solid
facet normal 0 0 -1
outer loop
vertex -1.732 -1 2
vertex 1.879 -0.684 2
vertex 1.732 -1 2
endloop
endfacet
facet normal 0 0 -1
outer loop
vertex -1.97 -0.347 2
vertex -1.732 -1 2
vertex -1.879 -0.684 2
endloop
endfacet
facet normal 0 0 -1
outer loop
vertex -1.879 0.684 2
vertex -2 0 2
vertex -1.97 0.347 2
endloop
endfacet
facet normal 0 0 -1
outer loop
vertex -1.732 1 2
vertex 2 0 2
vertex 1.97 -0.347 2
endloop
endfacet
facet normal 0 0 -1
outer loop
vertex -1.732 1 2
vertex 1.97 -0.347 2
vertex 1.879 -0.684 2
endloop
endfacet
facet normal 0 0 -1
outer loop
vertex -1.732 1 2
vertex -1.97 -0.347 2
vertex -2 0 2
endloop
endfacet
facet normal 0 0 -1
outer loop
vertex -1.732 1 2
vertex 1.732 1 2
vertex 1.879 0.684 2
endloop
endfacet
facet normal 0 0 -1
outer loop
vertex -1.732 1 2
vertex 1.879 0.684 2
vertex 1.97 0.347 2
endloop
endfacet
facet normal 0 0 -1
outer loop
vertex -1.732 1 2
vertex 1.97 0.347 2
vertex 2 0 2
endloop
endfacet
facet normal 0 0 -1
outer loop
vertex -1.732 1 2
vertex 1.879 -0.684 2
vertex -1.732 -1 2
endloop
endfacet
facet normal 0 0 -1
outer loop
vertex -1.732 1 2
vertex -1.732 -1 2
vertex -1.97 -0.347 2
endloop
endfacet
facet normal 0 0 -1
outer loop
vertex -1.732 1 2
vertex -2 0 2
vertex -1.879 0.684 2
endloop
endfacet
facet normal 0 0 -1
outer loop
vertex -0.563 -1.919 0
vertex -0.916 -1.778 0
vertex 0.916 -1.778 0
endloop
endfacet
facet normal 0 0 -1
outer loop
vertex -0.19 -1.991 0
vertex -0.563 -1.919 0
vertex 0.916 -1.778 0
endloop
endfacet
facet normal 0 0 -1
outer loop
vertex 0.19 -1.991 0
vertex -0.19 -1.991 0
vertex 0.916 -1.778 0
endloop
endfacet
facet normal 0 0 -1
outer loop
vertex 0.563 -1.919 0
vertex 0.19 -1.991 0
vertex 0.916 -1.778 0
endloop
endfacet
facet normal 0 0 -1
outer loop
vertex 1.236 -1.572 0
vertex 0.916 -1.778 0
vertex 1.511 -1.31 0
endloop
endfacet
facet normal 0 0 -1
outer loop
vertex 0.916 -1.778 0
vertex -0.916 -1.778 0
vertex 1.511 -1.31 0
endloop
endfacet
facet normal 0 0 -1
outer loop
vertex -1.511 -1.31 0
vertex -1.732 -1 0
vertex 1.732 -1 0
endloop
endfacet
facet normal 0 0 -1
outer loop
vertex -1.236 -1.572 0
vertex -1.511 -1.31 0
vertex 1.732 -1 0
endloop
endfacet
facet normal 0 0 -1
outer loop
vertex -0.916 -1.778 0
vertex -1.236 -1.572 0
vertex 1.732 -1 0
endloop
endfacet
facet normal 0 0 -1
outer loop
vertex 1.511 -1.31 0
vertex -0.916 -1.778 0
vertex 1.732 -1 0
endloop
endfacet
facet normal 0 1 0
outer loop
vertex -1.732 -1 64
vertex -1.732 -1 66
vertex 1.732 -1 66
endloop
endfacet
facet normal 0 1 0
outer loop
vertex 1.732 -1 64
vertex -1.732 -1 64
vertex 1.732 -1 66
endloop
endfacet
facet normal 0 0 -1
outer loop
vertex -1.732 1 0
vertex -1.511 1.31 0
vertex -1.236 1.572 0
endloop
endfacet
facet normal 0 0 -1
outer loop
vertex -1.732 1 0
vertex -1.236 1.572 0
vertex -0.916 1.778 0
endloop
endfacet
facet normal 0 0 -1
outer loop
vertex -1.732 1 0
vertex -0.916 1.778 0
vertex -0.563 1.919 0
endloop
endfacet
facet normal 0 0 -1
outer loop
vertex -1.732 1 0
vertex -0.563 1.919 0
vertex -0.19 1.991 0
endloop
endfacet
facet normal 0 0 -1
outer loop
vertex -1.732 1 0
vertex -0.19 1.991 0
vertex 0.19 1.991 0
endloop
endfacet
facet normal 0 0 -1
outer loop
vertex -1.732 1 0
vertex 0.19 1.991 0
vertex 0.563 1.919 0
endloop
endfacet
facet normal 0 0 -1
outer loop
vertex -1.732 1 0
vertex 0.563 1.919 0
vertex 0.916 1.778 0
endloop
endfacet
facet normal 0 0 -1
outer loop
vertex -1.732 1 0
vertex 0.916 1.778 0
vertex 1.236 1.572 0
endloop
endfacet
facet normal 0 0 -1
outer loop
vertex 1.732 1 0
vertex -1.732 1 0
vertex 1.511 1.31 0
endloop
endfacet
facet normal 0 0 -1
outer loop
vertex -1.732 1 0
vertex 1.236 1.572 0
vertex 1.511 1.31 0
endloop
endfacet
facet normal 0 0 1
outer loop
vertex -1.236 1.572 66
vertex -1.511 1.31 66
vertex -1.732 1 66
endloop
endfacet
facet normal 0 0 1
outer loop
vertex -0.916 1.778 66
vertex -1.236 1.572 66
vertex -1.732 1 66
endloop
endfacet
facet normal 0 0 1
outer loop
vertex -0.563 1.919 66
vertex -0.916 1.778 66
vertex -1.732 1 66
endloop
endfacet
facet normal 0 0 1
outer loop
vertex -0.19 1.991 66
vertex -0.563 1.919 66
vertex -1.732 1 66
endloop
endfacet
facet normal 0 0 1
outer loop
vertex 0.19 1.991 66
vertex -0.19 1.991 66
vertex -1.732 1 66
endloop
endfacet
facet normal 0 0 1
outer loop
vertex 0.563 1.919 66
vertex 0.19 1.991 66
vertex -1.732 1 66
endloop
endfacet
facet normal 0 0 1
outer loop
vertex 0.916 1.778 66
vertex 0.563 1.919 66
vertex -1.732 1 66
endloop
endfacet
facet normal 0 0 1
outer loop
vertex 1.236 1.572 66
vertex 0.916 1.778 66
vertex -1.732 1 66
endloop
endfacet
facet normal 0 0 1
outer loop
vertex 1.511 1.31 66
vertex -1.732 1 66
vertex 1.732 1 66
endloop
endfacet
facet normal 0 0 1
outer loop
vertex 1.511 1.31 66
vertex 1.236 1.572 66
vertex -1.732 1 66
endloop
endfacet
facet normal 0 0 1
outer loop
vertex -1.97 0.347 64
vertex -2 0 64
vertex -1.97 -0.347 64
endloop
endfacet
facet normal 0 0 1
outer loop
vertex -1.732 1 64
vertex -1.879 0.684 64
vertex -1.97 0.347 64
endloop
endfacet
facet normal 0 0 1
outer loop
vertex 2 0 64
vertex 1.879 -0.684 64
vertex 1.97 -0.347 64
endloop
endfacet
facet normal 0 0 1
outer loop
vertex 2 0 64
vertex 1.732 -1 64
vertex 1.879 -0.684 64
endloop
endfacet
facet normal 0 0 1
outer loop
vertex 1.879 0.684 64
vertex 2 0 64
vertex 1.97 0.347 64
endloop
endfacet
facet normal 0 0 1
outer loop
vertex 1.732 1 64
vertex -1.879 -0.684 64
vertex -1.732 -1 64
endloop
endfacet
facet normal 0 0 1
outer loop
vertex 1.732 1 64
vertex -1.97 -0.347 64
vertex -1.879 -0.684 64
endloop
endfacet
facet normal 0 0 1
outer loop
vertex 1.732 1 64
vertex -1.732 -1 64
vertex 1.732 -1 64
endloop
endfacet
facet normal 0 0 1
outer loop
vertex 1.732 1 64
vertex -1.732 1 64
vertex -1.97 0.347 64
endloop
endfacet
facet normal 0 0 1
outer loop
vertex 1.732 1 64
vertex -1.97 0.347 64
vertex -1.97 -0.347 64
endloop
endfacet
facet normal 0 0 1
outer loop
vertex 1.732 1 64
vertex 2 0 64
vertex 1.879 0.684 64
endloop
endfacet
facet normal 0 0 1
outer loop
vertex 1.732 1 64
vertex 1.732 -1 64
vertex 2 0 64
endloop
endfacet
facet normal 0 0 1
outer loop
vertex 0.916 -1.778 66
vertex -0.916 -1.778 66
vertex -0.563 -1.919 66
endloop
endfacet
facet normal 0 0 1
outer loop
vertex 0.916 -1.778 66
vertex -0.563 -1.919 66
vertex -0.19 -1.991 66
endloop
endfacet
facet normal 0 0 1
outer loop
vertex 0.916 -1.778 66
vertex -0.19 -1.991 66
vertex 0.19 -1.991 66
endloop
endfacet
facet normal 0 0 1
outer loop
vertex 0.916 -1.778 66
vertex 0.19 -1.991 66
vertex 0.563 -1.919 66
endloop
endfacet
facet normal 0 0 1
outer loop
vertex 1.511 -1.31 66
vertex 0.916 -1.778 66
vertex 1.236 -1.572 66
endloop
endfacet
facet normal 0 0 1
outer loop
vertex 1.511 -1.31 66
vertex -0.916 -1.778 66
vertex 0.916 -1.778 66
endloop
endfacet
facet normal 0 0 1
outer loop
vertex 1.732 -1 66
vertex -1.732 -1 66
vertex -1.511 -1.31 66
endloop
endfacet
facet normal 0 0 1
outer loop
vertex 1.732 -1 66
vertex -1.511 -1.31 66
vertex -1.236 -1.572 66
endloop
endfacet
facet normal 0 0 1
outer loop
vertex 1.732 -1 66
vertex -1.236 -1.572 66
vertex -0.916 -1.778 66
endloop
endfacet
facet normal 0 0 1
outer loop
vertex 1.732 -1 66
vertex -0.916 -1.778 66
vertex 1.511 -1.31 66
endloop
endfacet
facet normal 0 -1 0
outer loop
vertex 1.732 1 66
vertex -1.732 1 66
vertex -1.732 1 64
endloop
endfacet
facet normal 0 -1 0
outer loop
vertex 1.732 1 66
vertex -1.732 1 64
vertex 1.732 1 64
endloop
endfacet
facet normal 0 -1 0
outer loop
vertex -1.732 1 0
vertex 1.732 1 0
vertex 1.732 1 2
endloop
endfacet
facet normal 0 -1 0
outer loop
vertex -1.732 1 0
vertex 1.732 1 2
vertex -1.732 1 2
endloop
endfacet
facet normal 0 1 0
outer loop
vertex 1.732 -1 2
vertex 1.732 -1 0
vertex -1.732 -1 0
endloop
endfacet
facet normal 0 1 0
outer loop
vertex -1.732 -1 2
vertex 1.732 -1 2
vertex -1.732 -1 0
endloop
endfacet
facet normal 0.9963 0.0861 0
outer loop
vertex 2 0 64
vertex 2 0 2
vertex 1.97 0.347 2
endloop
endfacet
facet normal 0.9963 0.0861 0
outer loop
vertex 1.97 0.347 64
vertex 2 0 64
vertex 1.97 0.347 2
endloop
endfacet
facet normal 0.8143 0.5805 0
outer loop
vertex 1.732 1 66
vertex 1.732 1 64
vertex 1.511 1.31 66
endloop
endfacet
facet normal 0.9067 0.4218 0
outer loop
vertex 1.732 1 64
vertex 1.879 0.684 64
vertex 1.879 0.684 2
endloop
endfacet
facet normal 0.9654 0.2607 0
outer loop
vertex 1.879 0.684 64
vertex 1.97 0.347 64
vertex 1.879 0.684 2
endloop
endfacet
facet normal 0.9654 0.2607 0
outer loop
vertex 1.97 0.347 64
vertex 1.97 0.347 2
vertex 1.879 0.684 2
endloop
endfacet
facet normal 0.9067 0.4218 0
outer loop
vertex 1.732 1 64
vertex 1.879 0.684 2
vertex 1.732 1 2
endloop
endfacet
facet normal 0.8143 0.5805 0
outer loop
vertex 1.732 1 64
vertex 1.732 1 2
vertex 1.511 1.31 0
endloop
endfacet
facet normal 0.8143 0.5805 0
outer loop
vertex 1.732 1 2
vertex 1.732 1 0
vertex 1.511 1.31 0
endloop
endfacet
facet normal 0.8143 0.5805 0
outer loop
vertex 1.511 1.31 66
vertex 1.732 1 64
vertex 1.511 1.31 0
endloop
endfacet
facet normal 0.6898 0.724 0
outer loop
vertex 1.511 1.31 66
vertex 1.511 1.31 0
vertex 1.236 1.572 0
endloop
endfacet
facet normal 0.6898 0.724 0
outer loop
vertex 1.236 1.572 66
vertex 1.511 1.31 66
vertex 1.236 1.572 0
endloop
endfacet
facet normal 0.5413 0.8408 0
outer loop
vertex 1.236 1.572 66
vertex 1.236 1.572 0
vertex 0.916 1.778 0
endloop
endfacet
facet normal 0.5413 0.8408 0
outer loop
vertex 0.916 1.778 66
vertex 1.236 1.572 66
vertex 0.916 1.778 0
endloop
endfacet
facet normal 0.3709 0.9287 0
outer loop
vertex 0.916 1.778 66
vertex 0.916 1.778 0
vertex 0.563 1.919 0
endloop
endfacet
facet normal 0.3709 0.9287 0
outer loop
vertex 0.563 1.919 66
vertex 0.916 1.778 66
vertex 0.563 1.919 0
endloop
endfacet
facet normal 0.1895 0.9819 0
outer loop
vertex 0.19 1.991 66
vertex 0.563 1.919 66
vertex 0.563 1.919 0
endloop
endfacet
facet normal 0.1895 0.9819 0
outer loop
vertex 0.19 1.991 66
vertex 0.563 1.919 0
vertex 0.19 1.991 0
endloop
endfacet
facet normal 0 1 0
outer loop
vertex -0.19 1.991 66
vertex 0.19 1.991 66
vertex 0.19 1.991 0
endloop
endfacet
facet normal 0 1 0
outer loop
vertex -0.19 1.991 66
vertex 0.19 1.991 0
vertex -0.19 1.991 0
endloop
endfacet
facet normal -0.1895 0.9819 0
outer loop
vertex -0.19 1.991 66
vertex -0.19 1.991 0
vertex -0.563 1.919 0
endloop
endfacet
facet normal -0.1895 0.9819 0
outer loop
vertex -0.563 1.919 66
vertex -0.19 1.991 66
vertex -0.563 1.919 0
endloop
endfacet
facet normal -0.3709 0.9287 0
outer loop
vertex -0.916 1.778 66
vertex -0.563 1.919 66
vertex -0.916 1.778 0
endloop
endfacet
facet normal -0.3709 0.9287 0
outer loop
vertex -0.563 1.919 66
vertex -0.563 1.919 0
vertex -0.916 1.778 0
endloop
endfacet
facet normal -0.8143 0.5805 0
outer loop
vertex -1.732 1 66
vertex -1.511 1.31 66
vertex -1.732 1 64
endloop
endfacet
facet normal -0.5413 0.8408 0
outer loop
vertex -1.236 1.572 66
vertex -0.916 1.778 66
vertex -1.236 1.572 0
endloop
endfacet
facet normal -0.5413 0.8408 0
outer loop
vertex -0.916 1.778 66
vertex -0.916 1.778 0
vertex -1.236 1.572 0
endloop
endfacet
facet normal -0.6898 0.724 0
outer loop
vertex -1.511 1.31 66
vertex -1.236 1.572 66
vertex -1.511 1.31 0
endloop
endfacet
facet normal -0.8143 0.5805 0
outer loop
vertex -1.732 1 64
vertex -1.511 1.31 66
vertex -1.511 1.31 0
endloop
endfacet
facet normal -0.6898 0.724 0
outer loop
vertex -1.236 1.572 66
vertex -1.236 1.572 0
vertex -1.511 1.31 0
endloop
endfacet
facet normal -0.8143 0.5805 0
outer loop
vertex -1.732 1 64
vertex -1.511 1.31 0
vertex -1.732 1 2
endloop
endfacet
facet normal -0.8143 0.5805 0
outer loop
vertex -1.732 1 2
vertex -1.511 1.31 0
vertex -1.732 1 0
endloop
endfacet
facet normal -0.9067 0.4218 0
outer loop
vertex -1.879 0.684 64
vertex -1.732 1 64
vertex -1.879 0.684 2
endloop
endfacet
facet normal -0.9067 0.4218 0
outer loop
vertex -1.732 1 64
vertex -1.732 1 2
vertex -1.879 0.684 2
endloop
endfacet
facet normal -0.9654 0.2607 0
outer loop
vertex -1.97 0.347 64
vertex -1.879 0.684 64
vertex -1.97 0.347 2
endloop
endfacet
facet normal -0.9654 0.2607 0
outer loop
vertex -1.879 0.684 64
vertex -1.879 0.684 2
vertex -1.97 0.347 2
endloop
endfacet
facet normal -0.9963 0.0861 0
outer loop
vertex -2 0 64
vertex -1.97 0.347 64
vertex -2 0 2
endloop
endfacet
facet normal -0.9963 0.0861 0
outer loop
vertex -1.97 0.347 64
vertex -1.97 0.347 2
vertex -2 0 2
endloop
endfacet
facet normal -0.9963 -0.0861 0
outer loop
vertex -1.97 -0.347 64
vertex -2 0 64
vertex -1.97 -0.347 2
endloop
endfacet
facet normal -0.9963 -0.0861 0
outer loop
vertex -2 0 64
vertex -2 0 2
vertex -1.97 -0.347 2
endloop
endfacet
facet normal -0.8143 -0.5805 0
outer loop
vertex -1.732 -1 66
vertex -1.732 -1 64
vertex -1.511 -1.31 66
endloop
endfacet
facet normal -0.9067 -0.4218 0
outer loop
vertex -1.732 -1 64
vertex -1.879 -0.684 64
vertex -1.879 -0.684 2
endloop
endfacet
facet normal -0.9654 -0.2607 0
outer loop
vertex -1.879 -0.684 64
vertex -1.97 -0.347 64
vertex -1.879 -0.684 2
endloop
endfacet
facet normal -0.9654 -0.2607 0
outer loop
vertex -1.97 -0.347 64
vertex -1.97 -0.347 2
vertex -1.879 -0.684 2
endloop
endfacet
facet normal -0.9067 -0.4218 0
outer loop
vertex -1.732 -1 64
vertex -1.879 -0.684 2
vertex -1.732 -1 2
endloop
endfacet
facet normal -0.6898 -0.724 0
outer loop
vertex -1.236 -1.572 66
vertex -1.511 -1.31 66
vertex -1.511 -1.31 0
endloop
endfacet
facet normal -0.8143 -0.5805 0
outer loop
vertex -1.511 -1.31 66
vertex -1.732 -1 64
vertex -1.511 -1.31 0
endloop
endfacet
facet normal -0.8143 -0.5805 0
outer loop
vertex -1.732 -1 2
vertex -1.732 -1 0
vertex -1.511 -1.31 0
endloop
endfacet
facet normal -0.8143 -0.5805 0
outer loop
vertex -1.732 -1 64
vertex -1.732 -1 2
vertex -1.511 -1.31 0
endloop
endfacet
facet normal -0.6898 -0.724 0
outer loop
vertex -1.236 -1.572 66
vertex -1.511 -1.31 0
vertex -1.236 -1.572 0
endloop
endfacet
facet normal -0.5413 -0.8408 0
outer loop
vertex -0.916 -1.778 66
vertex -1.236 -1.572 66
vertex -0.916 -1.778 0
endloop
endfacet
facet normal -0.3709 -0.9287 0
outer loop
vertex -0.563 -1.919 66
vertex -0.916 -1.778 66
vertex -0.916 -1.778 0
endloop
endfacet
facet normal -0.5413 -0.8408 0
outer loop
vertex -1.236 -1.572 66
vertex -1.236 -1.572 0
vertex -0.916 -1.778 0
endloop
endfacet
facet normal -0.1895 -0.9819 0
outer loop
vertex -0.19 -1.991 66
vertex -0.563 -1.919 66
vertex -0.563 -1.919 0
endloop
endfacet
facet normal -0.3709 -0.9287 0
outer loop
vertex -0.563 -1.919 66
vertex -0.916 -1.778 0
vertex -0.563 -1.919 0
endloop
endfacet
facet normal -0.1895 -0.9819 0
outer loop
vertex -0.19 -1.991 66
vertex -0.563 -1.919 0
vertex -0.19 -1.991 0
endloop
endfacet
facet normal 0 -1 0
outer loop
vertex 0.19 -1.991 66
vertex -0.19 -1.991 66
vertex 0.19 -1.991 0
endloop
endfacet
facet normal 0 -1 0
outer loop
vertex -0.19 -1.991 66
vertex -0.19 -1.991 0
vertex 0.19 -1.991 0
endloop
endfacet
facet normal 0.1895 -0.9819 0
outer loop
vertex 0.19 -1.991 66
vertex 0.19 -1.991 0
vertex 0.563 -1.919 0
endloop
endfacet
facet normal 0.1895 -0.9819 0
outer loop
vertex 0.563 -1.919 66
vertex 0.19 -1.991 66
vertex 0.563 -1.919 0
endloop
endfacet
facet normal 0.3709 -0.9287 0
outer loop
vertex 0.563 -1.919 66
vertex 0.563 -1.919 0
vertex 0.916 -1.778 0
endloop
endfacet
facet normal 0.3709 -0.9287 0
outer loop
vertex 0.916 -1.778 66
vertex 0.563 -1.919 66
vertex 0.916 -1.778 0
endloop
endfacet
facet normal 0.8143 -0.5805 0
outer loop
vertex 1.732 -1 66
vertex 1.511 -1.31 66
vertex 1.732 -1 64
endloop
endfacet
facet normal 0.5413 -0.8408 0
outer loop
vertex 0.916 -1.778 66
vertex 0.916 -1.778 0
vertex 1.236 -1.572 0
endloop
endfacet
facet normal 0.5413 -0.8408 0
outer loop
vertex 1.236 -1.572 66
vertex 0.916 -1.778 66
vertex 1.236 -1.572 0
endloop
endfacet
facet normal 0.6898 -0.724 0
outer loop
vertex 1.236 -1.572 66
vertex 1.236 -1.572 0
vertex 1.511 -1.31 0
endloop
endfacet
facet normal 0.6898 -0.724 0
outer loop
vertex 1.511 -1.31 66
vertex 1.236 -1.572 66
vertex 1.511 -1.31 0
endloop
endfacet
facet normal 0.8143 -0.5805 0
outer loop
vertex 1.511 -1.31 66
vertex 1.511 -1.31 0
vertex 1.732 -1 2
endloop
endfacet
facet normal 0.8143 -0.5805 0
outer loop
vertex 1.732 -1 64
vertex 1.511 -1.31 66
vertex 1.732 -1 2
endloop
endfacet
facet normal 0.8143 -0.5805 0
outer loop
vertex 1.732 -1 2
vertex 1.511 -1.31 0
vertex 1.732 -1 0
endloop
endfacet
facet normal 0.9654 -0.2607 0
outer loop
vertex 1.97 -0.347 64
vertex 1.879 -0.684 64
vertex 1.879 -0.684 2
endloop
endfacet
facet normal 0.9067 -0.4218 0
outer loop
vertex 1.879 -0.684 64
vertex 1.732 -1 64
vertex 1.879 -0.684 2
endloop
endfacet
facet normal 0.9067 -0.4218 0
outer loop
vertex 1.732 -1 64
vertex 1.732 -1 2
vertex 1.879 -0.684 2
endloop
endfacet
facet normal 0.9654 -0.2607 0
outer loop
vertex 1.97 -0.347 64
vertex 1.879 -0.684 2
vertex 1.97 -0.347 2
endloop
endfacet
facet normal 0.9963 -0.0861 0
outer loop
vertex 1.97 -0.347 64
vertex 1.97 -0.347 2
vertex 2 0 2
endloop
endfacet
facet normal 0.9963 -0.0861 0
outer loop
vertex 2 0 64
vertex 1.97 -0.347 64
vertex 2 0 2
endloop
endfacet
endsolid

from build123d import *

# Parameters (mm, degrees)
ESQUISSE1_R             = 2
BOSS_EXTRU_1_DEPTH      = 66
ESQUISSE2_W             = 7.5
ESQUISSE2_H             = 2
ENL_V_MAT_EXTRU_1_DEPTH = 2
ESQUISSE3_W             = 7.5
ESQUISSE3_H             = 2
ENL_V_MAT_EXTRU_2_DEPTH = 2


with BuildPart() as part:
    # Esquisse1 → Boss.-Extru.1 (new body)
    with BuildSketch(Plane.XY):
        Circle(ESQUISSE1_R)
    extrude(amount=BOSS_EXTRU_1_DEPTH)

    # Esquisse2 → Enlèv. mat.-Extru.1 (cut)
    with BuildSketch(Plane.XY.offset(66)):
        Rectangle(ESQUISSE2_W, ESQUISSE2_H)
    extrude(amount=-ENL_V_MAT_EXTRU_1_DEPTH, mode=Mode.SUBTRACT)

    # Esquisse3 → Enlèv. mat.-Extru.2 (cut)
    with BuildSketch(Plane(origin=(0, 0, 0), x_dir=(-1, 0, 0), z_dir=(0, 0, -1))):
        Rectangle(ESQUISSE3_W, ESQUISSE3_H)
    extrude(amount=-ENL_V_MAT_EXTRU_2_DEPTH, mode=Mode.SUBTRACT)


solid = part.part
